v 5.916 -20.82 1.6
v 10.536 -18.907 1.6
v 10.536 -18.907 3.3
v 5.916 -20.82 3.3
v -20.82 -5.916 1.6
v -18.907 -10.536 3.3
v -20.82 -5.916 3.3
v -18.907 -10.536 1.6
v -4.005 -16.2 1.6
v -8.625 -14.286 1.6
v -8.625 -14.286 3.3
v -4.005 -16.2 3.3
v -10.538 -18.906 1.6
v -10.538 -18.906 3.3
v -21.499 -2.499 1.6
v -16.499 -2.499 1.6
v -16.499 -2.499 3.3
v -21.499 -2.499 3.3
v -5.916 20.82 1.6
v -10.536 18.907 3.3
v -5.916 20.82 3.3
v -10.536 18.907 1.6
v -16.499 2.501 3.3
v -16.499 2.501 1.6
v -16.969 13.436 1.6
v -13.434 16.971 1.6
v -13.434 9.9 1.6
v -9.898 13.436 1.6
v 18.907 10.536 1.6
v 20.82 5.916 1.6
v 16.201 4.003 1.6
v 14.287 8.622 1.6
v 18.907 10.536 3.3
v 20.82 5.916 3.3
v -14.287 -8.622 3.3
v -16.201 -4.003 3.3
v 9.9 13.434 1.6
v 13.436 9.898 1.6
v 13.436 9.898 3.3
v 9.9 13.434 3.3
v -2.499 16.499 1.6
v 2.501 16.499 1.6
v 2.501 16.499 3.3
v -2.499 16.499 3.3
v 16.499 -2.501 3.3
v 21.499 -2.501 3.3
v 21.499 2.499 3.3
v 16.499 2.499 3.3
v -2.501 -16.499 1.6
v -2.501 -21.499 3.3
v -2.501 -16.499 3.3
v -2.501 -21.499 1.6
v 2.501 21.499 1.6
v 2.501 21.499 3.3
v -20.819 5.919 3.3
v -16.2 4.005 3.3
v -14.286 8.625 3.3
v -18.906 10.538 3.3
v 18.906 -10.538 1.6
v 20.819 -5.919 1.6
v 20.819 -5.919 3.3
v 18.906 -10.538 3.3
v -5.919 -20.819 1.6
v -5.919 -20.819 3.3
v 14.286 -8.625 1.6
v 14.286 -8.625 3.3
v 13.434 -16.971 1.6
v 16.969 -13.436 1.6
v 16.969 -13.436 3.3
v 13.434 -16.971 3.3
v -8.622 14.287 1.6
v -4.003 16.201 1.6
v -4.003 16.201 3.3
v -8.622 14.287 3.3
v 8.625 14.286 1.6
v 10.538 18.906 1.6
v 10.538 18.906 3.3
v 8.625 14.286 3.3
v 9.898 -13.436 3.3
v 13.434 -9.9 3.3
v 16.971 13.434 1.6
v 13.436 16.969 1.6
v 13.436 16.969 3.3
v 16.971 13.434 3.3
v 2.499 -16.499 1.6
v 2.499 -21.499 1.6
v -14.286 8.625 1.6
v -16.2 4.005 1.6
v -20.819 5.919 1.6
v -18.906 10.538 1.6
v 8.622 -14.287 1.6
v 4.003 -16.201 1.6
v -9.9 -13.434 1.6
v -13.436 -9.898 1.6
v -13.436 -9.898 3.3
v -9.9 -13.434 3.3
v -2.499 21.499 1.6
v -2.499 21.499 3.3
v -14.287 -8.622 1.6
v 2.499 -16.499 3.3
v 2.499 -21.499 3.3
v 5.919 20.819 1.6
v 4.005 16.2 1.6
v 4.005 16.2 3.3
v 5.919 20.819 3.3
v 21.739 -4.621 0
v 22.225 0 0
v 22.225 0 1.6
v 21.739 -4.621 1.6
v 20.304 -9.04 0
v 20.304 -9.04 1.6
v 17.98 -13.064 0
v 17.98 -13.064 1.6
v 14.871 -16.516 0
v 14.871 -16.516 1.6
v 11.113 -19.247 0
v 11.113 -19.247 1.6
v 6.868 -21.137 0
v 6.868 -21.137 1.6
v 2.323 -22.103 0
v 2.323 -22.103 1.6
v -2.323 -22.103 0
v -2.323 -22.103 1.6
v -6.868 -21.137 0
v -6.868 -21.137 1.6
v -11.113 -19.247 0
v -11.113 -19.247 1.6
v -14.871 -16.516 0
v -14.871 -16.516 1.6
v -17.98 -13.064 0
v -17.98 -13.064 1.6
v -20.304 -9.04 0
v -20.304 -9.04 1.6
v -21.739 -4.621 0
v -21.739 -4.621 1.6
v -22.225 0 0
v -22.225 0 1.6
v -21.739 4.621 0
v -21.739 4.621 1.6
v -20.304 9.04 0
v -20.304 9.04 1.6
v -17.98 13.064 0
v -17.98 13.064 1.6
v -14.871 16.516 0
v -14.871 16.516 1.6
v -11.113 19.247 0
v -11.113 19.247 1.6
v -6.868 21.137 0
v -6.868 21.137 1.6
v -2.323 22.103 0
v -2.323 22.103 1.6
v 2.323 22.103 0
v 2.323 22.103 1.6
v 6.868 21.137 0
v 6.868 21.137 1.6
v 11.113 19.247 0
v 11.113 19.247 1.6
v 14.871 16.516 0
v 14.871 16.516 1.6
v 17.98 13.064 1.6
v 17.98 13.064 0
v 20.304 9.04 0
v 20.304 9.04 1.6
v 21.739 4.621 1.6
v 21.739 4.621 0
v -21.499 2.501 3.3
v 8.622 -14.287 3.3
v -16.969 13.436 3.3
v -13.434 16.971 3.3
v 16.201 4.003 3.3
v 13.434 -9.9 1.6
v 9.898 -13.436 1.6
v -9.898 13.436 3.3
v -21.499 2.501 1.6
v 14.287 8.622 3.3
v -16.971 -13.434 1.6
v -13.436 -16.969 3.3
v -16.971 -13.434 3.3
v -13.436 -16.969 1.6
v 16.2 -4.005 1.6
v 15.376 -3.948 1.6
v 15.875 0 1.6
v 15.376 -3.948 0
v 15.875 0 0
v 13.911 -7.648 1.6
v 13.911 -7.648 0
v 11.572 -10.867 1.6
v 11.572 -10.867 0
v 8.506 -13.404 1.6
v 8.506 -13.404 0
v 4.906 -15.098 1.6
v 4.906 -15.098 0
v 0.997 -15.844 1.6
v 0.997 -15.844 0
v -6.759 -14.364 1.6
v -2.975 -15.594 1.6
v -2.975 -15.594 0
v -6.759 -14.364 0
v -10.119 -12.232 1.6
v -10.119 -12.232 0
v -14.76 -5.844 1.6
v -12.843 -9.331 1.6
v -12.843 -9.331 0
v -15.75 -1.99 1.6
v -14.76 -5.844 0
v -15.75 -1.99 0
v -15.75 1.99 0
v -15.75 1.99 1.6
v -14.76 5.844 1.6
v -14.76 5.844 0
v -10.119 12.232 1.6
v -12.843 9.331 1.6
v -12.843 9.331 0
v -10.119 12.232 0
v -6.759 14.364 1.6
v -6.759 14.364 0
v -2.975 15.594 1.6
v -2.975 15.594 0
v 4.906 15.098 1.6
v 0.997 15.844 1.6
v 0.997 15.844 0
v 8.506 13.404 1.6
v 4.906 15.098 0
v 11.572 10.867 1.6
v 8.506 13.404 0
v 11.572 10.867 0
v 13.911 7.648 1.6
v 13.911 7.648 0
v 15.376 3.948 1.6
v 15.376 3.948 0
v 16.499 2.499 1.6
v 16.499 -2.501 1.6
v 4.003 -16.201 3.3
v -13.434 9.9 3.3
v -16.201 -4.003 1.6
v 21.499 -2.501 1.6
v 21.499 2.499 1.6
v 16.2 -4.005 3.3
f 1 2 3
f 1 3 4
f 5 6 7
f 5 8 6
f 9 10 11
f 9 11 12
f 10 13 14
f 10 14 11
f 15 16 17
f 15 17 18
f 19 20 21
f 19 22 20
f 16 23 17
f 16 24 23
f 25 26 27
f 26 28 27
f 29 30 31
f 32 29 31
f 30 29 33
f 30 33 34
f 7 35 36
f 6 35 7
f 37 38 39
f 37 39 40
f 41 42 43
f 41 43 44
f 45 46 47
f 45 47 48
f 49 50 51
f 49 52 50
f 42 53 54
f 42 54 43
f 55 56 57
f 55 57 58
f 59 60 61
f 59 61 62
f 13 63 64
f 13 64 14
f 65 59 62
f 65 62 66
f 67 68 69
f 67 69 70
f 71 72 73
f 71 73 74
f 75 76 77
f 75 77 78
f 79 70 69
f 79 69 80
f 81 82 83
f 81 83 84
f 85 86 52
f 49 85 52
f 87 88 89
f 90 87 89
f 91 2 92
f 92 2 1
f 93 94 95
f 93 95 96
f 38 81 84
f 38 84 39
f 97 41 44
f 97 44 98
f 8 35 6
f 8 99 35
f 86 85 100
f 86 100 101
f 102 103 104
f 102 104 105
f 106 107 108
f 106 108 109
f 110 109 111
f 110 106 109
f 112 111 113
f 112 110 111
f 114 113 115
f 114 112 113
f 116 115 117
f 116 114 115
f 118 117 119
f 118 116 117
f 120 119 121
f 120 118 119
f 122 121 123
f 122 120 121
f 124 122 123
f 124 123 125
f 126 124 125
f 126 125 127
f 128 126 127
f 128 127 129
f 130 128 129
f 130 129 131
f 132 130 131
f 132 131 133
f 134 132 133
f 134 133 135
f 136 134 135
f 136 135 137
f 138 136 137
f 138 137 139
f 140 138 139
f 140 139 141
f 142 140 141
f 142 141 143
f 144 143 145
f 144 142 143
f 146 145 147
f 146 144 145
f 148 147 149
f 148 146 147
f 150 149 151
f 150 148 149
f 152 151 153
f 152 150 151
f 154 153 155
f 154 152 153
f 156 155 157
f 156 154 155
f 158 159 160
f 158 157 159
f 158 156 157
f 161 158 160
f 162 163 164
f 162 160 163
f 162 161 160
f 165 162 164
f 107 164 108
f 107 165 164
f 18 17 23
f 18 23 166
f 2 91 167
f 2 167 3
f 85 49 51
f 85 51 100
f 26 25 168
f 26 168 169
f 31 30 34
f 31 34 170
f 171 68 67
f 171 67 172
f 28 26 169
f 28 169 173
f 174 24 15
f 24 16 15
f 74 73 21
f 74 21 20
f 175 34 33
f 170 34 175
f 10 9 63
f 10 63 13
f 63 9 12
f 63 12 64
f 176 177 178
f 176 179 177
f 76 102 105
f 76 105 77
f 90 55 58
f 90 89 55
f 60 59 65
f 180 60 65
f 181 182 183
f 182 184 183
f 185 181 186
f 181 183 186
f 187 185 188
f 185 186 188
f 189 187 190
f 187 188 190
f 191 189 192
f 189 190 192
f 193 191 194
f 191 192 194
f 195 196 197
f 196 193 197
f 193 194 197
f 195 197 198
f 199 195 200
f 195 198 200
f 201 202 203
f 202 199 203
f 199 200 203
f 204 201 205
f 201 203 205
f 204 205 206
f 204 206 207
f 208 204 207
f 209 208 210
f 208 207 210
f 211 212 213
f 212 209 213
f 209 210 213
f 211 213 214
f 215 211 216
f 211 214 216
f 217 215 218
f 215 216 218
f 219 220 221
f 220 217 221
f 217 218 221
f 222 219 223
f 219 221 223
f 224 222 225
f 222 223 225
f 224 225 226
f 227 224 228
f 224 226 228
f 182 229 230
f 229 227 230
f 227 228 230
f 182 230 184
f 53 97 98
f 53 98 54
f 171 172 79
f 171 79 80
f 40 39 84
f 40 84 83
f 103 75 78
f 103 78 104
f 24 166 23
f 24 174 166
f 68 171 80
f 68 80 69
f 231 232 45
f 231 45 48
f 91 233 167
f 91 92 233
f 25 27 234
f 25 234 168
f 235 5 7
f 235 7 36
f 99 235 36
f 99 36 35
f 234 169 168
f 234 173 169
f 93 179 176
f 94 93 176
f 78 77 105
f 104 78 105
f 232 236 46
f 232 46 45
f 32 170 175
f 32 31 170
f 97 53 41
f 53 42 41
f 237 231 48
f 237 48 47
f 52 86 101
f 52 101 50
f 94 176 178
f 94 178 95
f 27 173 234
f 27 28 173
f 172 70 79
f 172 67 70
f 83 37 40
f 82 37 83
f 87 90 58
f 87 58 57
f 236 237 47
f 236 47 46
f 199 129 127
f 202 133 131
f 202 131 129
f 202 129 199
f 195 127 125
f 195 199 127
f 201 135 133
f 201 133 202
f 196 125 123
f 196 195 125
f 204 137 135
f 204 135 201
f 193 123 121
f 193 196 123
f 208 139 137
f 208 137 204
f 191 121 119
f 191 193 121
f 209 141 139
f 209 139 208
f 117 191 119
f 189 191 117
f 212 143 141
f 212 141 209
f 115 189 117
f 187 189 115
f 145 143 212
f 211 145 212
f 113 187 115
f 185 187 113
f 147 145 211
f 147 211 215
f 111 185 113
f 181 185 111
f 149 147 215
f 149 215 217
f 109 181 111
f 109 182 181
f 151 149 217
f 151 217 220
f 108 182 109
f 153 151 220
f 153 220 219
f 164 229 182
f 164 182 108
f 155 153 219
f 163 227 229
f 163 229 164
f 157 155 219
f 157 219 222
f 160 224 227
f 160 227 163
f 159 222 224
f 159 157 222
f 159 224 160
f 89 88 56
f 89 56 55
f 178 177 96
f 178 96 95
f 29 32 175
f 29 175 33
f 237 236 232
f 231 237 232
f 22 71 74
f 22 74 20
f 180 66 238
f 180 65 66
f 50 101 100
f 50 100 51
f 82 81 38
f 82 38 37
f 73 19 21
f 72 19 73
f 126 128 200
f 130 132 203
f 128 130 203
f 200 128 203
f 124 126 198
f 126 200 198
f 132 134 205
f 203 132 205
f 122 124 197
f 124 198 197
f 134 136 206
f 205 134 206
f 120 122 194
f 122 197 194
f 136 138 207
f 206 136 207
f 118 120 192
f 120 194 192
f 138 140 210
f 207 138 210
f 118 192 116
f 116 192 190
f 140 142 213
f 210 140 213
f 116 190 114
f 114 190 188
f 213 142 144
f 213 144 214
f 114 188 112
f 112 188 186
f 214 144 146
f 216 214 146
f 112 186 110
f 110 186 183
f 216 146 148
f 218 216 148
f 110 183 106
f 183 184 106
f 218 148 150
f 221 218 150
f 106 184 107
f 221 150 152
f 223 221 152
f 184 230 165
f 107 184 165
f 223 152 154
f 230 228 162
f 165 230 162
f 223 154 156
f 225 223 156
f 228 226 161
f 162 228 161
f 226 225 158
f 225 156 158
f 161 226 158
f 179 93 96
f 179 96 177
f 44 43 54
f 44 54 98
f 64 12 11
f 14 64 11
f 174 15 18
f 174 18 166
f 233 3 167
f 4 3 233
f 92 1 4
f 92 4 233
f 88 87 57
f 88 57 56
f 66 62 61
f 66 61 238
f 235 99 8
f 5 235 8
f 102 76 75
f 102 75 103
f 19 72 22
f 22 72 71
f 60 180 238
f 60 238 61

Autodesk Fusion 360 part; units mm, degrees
sketch "PCB" plane through (0, 0, 0) normal (0, 0, 1) x (1, 0, 0)
  circle A0 centre (0, 0) radius 15.875
  circle A1 centre (0, 0) radius 22.225
  dimension "d1" = 31.75
  dimension "d2" = 44.45
extrude "Extrude1" add sketch "PCB" along normal blind 1.6 makes body 1
sketch "LEDs" plane through (0, 0, 1.6) normal (0, 0, 1) x (-1, 0, 0)
  circle A0 centre (0, 0) radius 15.875
  circle A1 centre (0, 0) radius 22.225
  line L0 (-2.5013, -16.4993) -> (2.4987, -16.4993)
  line L1 (2.4987, -16.4993) -> (2.4987, -21.4993)
  line L2 (2.4987, -21.4993) -> (-2.5013, -21.4993)
  line L3 (-2.5013, -21.4993) -> (-2.5013, -16.4993)
  line L4 (-2.5013, -16.4993) -> (2.4987, -21.4993) construction
  line L5 (2.4987, -16.4993) -> (-2.5013, -21.4993) construction
  line L6 (10.5359, -18.9066) -> (5.9165, -20.82)
  line L7 (8.6225, -14.2872) -> (10.5359, -18.9066)
  line L8 (5.9165, -20.82) -> (4.0031, -16.2006)
  line L9 (4.0031, -16.2006) -> (8.6225, -14.2872)
  line L10 (16.9691, -13.4355) -> (13.4336, -16.971)
  line L11 (13.4336, -9.8999) -> (16.9691, -13.4355)
  line L12 (13.4336, -16.971) -> (9.898, -13.4355)
  line L13 (9.898, -13.4355) -> (13.4336, -9.8999)
  line L14 (20.8189, -5.919) -> (18.9055, -10.5384)
  line L15 (16.1996, -4.0055) -> (20.8189, -5.919)
  line L16 (18.9055, -10.5384) -> (14.2861, -8.6249)
  line L17 (14.2861, -8.6249) -> (16.1996, -4.0055)
  line L18 (21.4993, 2.4987) -> (21.4993, -2.5013)
  line L19 (16.4993, 2.4987) -> (21.4993, 2.4987)
  line L20 (21.4993, -2.5013) -> (16.4993, -2.5013)
  line L21 (16.4993, -2.5013) -> (16.4993, 2.4987)
  line L22 (18.9066, 10.5359) -> (20.82, 5.9165)
  line L23 (14.2872, 8.6225) -> (18.9066, 10.5359)
  line L24 (20.82, 5.9165) -> (16.2006, 4.0031)
  line L25 (16.2006, 4.0031) -> (14.2872, 8.6225)
  line L26 (13.4355, 16.9691) -> (16.971, 13.4336)
  line L27 (9.8999, 13.4336) -> (13.4355, 16.9691)
  line L28 (16.971, 13.4336) -> (13.4355, 9.898)
  line L29 (13.4355, 9.898) -> (9.8999, 13.4336)
  line L30 (5.919, 20.8189) -> (10.5384, 18.9055)
  line L31 (4.0055, 16.1996) -> (5.919, 20.8189)
  line L32 (10.5384, 18.9055) -> (8.6249, 14.2861)
  line L33 (8.6249, 14.2861) -> (4.0055, 16.1996)
  line L34 (-2.4987, 21.4993) -> (2.5013, 21.4993)
  line L35 (-2.4987, 16.4993) -> (-2.4987, 21.4993)
  line L36 (2.5013, 21.4993) -> (2.5013, 16.4993)
  line L37 (2.5013, 16.4993) -> (-2.4987, 16.4993)
  line L38 (-10.5359, 18.9066) -> (-5.9165, 20.82)
  line L39 (-8.6225, 14.2872) -> (-10.5359, 18.9066)
  line L40 (-5.9165, 20.82) -> (-4.0031, 16.2006)
  line L41 (-4.0031, 16.2006) -> (-8.6225, 14.2872)
  line L42 (-16.9691, 13.4355) -> (-13.4336, 16.971)
  line L43 (-13.4336, 9.8999) -> (-16.9691, 13.4355)
  line L44 (-13.4336, 16.971) -> (-9.898, 13.4355)
  line L45 (-9.898, 13.4355) -> (-13.4336, 9.8999)
  line L46 (-20.8189, 5.919) -> (-18.9055, 10.5384)
  line L47 (-16.1996, 4.0055) -> (-20.8189, 5.919)
  line L48 (-18.9055, 10.5384) -> (-14.2861, 8.6249)
  line L49 (-14.2861, 8.6249) -> (-16.1996, 4.0055)
  line L50 (-21.4993, -2.4987) -> (-21.4993, 2.5013)
  line L51 (-16.4993, -2.4987) -> (-21.4993, -2.4987)
  line L52 (-21.4993, 2.5013) -> (-16.4993, 2.5013)
  line L53 (-16.4993, 2.5013) -> (-16.4993, -2.4987)
  line L54 (-18.9066, -10.5359) -> (-20.82, -5.9165)
  line L55 (-14.2872, -8.6225) -> (-18.9066, -10.5359)
  line L56 (-20.82, -5.9165) -> (-16.2006, -4.0031)
  line L57 (-16.2006, -4.0031) -> (-14.2872, -8.6225)
  line L58 (-13.4355, -16.9691) -> (-16.971, -13.4336)
  line L59 (-9.8999, -13.4336) -> (-13.4355, -16.9691)
  line L60 (-16.971, -13.4336) -> (-13.4355, -9.898)
  line L61 (-13.4355, -9.898) -> (-9.8999, -13.4336)
  line L62 (-5.919, -20.8189) -> (-10.5384, -18.9055)
  line L63 (-4.0055, -16.1996) -> (-5.919, -20.8189)
  line L64 (-10.5384, -18.9055) -> (-8.6249, -14.2861)
  line L65 (-8.6249, -14.2861) -> (-4.0055, -16.1996)
  point P0 (-0.0013, -18.9993)
  dimension "d5" = 5
  dimension "d6" = 5
  dimension "d8" = 360
extrude "Extrude2" add sketch "LEDs" along normal blind 1.7 separate body contours L0 L1 L2 L3 | L6 L7 L8 L9 | L10 L11 L12 L13 | L14 L15 L16 L17 | L18 L19 L20 L21 | L22 L23 L24 L25 | L26 L27 L28 L29 | L30 L31 L32 L33 | L34 L35 L36 L37 | L38 L39 L40 L41 | L42 L43 L44 L45 | L46 L47 L48 L49 | L50 L51 L52 L53 | L54 L55 L56 L57 | L58 L59 L60 L61 | L62 L63 L64 L65 makes body 2 at (13.4336, -12.257, 1.6) makes body 3 at (-6.1832, -17.1015, 1.6) makes body 4 at (-16.4648, -7.7205, 1.6) makes body 5 at (-7.7205, 16.4648, 1.6) makes body 6 at (-0.832, 18.166, 1.6) makes body 7 at (6.821, 18.6413, 1.6) makes body 8 at (18.6424, 6.8185, 1.6) makes body 9 at (7.7205, -16.4648, 1.6) makes body 10 at (17.1015, -6.1832, 1.6) makes body 11 at (-12.257, -13.4336, 1.6) makes body 12 at (-18.166, -0.832, 1.6) makes body 13 at (-13.4336, 12.257, 1.6) makes body 14 at (-18.0035, 8.3608, 1.6) makes body 15 at (13.4355, 14.6121, 1.6) makes body 16 at (19.8326, -0.8347, 1.6) makes body 17 at (0.832, -18.166, 1.6)
sketch "mount tester" plane through (0, 0, 0) normal (0, 0, 1) x (1, 0, 0)
  circle A0 centre (0, 0) radius 25.5
  circle A1 centre (0, 0) radius 22.225
  circle A2 centre (0, 0) radius 15.875
  circle A3 centre (0, 0) radius 23.425
  circle A4 centre (0, 0) radius 14.675
  circle A5 centre (0, 0) radius 22.425
  circle A6 centre (0, 0) radius 15.675
  dimension "d11" = 51
  dimension "d12" = 0.2
  dimension "d13" = 0.2
  dimension "d18" = 1
  dimension "d19" = 1
extrude "Extrude3" add sketch "mount tester" against normal blind 1 separate body contours A0 | A1 | A2 | A3 | A5 | A6 makes body 18
extrude "Extrude4" add sketch "mount tester" along normal blind 3.5 contours A3 | A6 bodies 18
chamfer "Chamfer1" distance 1 angle 45 1 edges at (-23.7743, 9.2212, -1) on bodies 18
hidden bodies 18
